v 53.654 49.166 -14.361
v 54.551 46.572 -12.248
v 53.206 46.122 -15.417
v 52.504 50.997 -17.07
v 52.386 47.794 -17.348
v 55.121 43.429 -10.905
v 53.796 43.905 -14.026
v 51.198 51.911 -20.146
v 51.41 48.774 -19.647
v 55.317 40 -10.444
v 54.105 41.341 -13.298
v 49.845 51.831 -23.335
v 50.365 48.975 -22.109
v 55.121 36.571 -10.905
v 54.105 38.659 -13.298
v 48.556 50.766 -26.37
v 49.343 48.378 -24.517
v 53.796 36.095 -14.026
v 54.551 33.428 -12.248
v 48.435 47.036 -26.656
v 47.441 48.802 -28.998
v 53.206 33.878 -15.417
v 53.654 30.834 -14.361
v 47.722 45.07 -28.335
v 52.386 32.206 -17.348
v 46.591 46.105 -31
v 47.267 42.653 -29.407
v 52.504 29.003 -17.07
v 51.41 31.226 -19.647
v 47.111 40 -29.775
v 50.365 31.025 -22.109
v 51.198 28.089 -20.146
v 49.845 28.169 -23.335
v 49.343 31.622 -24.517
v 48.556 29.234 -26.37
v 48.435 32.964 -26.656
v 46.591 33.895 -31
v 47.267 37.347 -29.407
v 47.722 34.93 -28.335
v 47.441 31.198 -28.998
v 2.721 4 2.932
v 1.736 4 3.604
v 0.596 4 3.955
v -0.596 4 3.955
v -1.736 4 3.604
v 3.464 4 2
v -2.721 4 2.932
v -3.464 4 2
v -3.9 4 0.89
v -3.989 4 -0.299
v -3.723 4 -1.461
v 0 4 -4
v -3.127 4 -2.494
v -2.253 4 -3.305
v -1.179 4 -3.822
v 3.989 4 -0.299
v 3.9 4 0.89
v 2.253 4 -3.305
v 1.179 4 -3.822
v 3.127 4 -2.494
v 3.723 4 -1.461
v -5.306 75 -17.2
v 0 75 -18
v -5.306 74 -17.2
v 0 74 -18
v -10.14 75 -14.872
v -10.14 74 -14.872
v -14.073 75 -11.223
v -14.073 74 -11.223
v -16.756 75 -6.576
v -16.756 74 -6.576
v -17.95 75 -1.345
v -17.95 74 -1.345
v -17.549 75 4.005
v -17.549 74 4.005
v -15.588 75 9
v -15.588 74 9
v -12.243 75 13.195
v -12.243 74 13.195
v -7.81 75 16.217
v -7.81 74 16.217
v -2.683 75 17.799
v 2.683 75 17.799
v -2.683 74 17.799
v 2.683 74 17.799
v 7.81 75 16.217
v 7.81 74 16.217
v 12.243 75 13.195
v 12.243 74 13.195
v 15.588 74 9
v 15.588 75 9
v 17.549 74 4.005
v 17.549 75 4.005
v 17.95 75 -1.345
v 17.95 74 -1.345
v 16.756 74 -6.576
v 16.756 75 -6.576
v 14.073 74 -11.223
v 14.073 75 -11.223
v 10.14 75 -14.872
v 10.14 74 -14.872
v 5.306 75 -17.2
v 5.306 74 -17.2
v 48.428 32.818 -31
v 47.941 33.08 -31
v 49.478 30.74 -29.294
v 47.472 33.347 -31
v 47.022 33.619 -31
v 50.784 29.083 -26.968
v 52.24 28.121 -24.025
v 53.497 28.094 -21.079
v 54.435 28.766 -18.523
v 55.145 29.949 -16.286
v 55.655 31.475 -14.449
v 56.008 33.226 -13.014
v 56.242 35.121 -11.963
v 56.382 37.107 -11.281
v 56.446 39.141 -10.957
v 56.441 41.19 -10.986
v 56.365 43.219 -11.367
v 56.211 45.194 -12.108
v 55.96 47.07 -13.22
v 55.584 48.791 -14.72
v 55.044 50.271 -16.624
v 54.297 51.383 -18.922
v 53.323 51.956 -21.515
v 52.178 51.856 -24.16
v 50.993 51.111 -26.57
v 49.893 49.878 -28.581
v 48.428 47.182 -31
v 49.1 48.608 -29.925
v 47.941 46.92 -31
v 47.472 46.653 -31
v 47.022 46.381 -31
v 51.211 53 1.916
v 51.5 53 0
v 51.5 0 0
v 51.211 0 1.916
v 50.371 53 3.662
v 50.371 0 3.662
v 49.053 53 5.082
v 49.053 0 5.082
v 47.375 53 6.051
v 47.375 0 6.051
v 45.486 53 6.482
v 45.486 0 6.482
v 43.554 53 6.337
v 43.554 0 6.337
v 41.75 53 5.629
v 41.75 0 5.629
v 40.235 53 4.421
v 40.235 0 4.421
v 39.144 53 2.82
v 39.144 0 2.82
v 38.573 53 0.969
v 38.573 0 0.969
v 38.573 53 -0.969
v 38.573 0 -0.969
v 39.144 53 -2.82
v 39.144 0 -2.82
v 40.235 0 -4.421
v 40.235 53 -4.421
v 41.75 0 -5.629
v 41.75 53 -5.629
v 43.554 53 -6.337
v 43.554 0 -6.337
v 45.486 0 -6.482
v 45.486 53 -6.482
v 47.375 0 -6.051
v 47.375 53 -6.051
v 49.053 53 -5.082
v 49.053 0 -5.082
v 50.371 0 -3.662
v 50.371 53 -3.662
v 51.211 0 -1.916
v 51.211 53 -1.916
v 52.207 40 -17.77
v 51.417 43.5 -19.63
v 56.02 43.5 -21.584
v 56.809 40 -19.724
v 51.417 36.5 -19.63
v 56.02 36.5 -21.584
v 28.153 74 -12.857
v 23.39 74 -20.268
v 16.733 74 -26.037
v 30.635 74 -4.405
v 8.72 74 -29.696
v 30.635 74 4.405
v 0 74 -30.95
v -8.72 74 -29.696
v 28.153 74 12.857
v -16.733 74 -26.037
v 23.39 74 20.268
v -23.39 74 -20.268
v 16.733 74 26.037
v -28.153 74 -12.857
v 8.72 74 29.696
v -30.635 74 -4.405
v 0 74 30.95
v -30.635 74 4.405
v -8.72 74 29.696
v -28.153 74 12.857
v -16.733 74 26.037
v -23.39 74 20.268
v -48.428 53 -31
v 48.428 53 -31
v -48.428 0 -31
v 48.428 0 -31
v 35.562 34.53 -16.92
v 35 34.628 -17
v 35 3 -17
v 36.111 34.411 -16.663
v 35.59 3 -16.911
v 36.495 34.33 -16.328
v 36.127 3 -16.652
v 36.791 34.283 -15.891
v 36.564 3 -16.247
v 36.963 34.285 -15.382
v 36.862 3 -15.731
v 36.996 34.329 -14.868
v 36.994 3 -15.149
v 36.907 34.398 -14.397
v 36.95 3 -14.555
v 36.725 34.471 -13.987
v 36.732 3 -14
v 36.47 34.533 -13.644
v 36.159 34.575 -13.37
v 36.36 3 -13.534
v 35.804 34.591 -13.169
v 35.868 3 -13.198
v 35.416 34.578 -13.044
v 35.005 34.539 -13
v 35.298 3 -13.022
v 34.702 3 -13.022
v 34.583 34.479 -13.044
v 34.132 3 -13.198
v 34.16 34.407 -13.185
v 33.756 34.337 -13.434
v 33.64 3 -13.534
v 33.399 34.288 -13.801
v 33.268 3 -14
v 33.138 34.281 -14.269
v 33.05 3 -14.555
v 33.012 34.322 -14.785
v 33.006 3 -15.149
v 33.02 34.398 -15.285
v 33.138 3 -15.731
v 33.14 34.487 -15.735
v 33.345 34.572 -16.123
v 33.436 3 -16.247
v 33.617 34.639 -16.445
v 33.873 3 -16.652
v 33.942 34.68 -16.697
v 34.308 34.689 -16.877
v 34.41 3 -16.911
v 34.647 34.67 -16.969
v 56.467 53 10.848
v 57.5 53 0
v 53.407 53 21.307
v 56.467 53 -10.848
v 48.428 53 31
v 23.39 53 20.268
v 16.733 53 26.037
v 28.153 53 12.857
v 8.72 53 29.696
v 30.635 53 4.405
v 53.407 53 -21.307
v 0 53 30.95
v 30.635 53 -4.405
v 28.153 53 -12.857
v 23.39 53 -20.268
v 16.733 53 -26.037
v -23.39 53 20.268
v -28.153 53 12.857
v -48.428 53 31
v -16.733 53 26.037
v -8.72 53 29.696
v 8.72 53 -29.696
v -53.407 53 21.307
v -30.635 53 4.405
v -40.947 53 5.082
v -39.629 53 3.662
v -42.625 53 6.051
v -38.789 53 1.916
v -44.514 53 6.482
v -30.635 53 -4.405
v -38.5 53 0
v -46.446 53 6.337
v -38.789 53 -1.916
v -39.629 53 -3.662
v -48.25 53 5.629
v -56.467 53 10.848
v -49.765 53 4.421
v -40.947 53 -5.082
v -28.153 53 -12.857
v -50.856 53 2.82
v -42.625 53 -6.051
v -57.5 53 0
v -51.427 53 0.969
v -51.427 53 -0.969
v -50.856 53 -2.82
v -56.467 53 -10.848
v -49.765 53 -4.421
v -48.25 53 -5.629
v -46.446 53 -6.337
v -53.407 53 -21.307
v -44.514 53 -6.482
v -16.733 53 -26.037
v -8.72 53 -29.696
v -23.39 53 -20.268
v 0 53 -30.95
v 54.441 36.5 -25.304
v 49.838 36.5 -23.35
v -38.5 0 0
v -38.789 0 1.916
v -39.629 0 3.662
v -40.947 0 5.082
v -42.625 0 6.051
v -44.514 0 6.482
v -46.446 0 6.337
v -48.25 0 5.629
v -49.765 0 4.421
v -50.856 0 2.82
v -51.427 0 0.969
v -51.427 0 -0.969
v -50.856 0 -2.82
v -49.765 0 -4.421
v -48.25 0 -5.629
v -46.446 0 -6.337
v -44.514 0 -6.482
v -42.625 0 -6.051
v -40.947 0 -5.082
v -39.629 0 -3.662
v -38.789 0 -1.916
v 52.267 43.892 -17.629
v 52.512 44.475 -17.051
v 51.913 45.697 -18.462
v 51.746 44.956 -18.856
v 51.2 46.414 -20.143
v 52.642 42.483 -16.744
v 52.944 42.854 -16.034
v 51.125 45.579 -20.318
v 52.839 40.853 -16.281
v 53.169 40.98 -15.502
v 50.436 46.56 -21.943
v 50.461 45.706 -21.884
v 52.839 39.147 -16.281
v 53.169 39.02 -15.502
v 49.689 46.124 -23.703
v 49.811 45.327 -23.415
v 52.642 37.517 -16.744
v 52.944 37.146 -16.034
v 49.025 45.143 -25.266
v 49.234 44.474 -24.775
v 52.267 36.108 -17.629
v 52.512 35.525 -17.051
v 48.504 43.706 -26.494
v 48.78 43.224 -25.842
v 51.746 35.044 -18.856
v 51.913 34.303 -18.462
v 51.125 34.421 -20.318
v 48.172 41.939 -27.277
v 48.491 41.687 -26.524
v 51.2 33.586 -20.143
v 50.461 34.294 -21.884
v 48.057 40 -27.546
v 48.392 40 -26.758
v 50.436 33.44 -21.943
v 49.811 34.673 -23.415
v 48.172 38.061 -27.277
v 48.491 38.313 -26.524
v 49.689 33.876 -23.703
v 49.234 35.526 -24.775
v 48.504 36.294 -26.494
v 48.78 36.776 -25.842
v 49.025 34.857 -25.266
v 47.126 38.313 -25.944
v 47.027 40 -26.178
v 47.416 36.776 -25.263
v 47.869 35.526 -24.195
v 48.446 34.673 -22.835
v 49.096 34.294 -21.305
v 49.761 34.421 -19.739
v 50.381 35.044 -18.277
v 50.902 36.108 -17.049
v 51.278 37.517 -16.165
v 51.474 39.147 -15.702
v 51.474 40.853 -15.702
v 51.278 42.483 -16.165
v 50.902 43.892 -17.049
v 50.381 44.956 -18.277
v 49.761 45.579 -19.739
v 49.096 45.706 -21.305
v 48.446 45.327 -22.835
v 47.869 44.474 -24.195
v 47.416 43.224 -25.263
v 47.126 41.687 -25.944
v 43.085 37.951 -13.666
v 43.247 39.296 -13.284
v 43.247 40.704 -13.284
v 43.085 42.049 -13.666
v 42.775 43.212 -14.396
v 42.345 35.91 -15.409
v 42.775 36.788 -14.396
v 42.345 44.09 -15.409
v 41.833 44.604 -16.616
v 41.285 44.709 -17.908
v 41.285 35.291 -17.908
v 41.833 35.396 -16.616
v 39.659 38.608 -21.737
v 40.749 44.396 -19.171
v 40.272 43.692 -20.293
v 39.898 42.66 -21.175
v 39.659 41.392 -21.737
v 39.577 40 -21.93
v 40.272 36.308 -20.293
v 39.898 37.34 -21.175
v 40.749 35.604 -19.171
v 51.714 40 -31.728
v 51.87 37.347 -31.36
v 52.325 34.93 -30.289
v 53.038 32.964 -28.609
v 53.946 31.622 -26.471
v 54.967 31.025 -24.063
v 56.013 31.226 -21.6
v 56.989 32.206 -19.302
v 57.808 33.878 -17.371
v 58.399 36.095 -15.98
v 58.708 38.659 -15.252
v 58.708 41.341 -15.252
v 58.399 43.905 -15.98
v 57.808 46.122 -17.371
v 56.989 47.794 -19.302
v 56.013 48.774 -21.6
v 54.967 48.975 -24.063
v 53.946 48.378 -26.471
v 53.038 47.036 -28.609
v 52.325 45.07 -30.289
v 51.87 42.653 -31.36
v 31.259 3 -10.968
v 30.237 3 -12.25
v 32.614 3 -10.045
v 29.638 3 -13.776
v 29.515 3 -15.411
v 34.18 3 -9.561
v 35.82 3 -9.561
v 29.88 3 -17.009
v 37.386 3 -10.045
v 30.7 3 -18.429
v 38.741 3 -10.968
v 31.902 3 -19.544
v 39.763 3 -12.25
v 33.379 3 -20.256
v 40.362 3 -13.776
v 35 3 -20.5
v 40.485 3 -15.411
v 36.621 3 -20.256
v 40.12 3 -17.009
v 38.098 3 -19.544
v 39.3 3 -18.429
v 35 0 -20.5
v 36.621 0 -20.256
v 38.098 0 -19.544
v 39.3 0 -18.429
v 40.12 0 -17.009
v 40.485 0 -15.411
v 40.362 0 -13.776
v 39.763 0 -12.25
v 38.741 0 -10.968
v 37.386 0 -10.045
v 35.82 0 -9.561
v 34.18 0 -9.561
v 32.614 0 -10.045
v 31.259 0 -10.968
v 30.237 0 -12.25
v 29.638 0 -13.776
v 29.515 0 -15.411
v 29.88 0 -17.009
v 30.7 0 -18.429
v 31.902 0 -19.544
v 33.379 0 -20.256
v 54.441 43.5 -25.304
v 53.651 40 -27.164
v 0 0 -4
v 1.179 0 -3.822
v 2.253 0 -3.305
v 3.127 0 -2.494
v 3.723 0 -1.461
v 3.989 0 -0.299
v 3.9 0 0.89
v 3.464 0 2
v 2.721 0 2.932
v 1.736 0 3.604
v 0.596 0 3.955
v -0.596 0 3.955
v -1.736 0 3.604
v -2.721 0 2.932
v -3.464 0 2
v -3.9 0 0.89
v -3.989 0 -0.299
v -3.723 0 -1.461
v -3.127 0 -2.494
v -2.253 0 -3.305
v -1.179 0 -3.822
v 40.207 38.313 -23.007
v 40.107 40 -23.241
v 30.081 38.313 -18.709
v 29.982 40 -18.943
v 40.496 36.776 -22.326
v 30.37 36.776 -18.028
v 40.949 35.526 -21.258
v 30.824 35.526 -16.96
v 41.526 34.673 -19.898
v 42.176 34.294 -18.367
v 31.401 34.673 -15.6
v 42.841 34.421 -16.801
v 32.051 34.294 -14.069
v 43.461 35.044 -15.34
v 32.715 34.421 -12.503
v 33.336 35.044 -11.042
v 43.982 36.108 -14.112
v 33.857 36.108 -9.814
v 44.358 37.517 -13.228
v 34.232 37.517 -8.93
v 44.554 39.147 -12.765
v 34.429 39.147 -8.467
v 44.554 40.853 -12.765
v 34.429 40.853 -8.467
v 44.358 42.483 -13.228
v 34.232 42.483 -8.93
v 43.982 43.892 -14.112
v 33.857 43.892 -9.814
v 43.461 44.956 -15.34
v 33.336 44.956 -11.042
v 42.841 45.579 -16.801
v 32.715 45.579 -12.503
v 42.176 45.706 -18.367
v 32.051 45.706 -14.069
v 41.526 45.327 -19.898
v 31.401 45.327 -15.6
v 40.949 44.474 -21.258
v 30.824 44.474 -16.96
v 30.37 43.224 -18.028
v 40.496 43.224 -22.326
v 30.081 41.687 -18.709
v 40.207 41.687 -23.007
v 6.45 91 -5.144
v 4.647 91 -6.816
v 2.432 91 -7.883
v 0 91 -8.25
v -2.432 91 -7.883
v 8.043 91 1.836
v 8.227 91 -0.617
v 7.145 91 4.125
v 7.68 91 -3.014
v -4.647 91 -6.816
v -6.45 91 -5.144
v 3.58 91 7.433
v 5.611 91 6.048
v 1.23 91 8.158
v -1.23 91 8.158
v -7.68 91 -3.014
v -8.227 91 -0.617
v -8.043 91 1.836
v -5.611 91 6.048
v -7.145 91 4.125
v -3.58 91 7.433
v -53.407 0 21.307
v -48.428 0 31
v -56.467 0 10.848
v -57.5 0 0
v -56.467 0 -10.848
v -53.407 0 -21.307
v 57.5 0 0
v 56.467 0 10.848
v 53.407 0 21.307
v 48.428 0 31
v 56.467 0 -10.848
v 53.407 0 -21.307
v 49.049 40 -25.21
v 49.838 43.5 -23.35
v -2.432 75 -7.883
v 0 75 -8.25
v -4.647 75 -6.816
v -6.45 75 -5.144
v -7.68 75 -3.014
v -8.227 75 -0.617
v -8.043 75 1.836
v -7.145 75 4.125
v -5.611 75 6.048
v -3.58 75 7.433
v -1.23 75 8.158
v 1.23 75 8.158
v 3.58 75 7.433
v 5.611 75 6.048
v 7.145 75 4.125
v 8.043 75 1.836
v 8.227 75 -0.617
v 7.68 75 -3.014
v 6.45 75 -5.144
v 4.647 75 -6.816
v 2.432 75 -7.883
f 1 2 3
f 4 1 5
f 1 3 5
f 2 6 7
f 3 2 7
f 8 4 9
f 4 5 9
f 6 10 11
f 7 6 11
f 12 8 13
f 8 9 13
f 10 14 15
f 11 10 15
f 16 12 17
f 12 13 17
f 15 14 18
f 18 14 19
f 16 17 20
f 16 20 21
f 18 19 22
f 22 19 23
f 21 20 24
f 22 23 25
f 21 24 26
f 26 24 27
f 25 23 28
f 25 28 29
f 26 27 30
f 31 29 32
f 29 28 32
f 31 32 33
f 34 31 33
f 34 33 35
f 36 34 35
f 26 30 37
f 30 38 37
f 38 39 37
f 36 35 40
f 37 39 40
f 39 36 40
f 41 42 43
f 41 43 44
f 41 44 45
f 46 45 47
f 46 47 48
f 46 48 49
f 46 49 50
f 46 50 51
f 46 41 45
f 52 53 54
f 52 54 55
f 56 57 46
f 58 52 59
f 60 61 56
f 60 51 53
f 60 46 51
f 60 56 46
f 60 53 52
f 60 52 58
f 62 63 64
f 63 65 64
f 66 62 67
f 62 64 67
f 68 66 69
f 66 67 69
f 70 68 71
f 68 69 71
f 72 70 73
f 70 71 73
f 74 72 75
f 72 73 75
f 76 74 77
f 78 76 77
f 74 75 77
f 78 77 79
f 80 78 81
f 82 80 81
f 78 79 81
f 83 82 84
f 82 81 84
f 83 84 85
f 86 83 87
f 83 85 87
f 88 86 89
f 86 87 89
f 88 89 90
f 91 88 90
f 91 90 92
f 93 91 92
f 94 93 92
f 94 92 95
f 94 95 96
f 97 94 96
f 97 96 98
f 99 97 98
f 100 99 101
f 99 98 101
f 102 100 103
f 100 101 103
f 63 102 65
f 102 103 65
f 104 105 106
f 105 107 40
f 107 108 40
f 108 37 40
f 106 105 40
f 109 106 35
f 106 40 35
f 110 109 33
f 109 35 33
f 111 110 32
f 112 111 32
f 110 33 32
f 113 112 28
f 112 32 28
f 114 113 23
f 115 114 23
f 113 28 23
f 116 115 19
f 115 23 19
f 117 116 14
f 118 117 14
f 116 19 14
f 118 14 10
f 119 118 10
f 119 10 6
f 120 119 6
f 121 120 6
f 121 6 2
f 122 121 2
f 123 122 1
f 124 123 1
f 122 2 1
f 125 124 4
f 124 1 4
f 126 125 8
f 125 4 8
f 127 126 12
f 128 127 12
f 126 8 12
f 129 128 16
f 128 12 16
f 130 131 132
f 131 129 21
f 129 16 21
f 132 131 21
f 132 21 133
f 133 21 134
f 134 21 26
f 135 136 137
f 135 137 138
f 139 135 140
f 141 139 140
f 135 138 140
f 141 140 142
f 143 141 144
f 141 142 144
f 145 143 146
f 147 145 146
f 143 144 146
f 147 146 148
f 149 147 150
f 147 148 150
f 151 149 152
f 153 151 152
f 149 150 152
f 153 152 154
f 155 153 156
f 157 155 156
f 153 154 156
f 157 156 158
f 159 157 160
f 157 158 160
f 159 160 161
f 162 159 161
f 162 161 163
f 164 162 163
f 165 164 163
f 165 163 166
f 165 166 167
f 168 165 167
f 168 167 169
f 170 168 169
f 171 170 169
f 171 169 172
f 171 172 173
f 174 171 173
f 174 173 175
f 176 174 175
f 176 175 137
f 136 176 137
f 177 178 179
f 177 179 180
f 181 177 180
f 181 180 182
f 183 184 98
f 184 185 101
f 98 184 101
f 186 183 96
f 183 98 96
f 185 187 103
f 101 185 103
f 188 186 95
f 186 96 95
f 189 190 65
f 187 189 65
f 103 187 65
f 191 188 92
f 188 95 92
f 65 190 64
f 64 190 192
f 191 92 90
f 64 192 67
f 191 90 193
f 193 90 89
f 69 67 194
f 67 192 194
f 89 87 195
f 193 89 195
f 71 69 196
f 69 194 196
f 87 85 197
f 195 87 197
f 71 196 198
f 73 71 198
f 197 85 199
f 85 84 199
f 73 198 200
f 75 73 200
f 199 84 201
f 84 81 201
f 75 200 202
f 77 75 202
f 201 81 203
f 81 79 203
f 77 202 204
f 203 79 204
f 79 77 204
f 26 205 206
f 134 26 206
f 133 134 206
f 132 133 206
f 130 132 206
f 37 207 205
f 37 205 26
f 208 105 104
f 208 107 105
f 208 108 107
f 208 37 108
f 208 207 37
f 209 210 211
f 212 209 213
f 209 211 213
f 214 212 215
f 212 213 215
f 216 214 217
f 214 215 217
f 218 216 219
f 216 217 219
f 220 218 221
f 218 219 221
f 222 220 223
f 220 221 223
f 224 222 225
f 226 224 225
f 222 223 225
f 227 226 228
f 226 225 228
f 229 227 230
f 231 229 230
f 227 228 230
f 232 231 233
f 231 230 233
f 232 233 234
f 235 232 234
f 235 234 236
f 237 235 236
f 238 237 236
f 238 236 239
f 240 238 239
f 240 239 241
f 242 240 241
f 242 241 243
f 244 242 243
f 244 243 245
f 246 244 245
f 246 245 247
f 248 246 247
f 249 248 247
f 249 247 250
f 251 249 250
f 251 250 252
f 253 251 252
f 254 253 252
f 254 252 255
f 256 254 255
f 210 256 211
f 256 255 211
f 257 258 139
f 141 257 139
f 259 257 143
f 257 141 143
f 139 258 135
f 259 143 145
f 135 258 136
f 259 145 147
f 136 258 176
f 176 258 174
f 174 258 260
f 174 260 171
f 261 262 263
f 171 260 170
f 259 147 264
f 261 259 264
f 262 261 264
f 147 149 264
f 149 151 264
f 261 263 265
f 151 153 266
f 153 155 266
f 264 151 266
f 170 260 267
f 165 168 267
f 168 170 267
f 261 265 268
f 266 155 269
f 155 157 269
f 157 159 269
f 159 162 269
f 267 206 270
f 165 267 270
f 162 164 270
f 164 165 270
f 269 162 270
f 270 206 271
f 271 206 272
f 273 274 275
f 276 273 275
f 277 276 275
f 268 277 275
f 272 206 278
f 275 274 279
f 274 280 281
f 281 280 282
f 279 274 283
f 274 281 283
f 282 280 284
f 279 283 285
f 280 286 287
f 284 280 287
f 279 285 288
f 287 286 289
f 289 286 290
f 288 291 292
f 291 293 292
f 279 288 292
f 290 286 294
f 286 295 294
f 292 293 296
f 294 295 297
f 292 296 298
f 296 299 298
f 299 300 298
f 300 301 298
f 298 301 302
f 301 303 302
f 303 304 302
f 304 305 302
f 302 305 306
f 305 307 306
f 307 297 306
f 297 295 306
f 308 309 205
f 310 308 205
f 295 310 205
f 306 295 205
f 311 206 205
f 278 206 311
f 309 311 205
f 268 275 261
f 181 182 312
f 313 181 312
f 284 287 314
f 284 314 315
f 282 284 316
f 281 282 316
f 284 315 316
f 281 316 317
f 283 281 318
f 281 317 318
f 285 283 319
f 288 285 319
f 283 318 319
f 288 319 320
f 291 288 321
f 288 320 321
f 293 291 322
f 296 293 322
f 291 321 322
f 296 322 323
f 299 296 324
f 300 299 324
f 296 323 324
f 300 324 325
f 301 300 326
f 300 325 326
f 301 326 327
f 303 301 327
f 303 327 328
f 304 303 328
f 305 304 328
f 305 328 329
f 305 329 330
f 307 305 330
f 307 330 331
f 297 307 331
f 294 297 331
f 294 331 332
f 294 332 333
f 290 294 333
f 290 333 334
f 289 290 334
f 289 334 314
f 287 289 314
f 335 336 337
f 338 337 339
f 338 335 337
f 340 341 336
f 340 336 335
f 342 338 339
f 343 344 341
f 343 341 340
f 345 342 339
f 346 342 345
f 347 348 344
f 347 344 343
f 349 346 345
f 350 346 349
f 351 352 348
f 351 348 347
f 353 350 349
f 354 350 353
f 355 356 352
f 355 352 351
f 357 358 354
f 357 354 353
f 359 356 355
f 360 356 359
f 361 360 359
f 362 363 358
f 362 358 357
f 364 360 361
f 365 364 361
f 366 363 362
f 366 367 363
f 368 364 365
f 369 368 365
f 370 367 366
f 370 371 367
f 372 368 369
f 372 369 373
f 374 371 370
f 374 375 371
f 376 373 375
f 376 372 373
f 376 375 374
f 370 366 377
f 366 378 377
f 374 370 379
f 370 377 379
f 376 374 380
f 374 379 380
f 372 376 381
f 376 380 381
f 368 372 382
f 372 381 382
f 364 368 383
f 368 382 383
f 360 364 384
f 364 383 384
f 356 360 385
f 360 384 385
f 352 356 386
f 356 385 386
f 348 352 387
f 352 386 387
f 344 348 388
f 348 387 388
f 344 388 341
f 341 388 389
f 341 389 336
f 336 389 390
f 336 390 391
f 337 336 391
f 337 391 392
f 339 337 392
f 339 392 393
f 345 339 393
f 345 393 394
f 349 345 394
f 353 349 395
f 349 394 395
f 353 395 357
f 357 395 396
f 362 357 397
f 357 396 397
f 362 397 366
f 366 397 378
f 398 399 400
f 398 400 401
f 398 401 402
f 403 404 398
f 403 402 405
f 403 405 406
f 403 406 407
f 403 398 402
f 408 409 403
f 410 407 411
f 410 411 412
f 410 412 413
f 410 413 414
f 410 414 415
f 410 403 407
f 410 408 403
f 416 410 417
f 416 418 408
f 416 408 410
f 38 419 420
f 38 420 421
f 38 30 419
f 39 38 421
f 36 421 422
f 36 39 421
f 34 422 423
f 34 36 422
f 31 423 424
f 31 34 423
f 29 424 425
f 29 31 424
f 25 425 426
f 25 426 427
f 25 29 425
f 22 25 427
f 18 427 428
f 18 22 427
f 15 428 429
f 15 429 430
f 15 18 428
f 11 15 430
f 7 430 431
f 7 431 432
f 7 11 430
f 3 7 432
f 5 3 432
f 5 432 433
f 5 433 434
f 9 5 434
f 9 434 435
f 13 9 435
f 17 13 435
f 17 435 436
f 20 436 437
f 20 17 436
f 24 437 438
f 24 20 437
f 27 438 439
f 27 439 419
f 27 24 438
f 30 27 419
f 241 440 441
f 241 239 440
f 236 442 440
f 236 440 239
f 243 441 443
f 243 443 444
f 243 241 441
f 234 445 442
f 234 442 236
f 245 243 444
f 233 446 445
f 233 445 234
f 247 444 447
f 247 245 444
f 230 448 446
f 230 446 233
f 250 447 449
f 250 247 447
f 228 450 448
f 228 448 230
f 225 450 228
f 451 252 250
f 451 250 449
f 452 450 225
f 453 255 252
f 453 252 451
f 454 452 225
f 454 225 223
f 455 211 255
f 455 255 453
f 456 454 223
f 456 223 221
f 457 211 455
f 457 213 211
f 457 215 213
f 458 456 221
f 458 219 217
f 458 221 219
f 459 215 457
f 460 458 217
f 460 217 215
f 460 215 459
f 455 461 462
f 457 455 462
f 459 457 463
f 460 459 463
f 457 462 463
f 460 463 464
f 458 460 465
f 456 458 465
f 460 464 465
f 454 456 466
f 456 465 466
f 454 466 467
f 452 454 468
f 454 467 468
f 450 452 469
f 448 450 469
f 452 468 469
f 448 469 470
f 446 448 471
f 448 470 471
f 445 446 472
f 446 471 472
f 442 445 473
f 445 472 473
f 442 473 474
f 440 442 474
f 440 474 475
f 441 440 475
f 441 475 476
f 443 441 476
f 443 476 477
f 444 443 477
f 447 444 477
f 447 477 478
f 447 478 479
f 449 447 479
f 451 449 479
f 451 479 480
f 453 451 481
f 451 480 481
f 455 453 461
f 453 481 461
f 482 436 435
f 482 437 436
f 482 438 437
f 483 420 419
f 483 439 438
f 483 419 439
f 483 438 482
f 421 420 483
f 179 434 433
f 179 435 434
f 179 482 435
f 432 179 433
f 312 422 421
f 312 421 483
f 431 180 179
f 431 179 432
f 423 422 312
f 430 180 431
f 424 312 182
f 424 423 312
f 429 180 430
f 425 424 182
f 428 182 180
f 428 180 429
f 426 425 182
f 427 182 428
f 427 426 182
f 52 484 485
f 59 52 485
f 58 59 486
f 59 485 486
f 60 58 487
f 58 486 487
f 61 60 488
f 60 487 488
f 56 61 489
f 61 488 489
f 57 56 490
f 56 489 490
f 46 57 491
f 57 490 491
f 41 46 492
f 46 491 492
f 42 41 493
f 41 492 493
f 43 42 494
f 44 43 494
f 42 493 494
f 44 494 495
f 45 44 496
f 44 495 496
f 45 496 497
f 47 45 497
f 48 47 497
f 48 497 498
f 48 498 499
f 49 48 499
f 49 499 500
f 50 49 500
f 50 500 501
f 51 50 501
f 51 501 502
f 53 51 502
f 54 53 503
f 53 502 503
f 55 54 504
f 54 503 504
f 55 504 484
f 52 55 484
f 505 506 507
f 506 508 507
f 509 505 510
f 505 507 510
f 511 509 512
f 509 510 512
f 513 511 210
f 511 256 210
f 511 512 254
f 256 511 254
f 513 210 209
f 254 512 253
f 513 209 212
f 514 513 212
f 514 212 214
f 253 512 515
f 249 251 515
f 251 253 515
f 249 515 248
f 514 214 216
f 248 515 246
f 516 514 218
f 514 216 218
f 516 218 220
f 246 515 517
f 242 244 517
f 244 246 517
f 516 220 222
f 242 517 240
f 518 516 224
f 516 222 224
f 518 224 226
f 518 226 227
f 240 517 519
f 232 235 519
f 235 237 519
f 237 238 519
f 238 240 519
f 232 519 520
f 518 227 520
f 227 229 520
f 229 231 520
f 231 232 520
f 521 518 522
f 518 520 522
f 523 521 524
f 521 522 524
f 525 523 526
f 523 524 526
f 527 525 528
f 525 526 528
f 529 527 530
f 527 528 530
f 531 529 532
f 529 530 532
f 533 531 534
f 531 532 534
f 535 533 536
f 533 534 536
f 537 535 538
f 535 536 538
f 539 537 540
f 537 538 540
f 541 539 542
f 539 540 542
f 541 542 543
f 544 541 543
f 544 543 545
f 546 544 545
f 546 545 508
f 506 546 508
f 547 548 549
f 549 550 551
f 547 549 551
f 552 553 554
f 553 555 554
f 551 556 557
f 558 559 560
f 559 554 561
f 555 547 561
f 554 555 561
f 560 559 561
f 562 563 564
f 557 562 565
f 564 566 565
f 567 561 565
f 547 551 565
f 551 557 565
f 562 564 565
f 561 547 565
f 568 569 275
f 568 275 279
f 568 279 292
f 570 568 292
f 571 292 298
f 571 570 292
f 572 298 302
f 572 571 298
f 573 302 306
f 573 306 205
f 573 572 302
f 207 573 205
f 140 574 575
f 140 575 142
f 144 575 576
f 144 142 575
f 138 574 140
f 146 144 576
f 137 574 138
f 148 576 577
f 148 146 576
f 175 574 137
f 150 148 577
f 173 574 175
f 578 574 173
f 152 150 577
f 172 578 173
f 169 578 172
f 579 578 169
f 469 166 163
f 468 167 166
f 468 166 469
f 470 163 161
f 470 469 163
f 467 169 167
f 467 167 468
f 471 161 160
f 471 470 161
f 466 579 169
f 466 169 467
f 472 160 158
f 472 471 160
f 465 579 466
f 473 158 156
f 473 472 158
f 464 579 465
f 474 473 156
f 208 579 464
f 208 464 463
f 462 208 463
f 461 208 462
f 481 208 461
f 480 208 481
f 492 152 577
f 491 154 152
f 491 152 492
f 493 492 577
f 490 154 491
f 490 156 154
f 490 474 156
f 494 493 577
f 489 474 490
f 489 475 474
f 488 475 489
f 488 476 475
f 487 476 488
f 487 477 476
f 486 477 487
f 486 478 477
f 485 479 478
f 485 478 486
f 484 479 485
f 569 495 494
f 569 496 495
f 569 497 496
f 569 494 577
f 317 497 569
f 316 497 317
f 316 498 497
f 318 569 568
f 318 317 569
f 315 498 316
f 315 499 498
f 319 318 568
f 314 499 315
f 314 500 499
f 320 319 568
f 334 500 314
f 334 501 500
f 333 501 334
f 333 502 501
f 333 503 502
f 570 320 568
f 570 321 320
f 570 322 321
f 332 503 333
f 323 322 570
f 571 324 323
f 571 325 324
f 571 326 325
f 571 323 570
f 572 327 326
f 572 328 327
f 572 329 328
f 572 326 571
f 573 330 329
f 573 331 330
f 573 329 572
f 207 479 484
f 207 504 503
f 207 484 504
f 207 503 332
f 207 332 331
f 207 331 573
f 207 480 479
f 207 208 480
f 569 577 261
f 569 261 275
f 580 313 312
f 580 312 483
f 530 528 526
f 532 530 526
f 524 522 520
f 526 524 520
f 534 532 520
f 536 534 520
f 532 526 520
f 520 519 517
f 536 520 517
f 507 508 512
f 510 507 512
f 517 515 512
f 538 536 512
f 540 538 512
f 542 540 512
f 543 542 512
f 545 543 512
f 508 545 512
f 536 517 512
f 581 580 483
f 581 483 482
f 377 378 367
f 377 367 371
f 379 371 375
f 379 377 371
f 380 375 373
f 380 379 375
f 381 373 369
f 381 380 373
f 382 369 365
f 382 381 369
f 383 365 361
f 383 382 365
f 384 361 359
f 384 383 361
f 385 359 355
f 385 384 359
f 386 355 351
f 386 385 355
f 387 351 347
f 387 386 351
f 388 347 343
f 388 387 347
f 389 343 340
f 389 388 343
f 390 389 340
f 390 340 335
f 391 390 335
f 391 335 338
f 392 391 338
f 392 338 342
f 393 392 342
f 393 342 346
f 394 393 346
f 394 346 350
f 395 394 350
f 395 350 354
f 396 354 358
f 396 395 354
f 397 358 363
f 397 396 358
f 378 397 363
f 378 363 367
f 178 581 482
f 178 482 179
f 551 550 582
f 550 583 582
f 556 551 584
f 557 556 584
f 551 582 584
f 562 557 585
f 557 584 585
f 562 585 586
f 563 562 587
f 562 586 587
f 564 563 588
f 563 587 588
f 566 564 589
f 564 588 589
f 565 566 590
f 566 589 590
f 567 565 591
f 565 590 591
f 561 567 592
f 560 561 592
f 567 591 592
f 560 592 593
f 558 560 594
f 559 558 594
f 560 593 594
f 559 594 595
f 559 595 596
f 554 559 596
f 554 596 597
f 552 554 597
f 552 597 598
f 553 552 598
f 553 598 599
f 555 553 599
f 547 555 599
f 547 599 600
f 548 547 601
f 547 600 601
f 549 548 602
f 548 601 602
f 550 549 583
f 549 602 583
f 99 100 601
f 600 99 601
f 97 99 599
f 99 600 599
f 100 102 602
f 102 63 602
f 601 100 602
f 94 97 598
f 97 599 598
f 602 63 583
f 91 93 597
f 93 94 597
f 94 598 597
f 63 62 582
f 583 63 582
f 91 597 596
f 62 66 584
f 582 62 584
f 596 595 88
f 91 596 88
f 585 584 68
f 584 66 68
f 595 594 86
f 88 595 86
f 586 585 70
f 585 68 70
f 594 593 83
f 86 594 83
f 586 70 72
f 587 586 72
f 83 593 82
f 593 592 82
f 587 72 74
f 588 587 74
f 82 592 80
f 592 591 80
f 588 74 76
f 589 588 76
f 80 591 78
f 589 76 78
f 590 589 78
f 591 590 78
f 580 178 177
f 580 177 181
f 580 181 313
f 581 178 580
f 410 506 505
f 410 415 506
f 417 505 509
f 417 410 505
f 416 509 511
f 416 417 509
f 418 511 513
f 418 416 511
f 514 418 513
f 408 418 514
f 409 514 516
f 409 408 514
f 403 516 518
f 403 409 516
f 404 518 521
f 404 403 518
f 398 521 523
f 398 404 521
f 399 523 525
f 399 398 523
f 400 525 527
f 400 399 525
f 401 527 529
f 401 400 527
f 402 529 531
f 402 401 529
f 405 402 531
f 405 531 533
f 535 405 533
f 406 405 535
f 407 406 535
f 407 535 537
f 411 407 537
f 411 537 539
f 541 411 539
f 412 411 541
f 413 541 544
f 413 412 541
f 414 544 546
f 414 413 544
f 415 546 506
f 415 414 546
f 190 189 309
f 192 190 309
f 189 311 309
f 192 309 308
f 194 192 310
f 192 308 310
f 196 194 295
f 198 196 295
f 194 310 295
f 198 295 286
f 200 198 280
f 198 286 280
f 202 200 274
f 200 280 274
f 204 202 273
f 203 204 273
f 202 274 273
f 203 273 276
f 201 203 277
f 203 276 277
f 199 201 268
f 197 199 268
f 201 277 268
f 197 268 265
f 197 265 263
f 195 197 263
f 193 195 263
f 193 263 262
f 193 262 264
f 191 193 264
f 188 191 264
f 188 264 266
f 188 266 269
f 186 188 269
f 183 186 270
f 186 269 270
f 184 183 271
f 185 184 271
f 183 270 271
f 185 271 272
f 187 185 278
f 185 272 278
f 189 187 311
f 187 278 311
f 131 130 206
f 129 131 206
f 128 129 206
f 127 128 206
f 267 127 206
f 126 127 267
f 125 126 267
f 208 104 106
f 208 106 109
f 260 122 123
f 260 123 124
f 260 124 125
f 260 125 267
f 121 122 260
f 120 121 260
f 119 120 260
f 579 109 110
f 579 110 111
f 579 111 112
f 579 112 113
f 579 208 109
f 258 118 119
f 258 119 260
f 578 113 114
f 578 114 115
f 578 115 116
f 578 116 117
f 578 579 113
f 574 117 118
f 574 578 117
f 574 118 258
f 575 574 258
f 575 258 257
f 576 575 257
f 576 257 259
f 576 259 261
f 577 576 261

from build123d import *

# Parameters (mm, degrees)
EXTRUDE1_DEPTH     = 53
HOLE1_D            = 13
HOLE1_DEPTH        = 53
SKETCH5_R          = 4
CUT_EXTRUDE1_DEPTH = 4
SKETCH6_R          = 5.5
CUT_EXTRUDE2_DEPTH = 3
SKETCH7_R          = 2
CUT_EXTRUDE3_DEPTH = 33
CUT_EXTRUDE4_DEPTH = 5


with BuildPart() as part:
    # Sketch1 → Extrude1 (new body)
    with BuildSketch(Plane(origin=(0, 0, 0), x_dir=(1, 0, 0), z_dir=(0, 1, 0))):
        with BuildLine():
            Line((-48.427781283, 31), (48.427781283, 31))
            ThreePointArc((48.427781283, 31), (57.5, 0), (48.427781283, -31))
            Line((48.427781283, -31), (-48.427781283, -31))
            ThreePointArc((-48.427781283, -31), (-57.5, 0), (-48.427781283, 31))
        make_face()
    extrude(amount=EXTRUDE1_DEPTH)

    # Sketch2 → Revolve1 (revolve)
    with BuildSketch(Plane.XY, mode=Mode.PRIVATE) as revolve1_sk:
        Polygon((0, 91), (-8.25, 91), (-8.25, 75), (-18, 75), (-18, 74), (-30.95, 74), (-30.95, 53), (0, 53), align=None)
    revolve(revolve1_sk.sketch.rotate(Axis((0, 0, 0), (0, 1, 0)), 270), axis=Axis((0, 0, 0), (0, 1, 0)))  # turned: the seam where the file's is

    # Hole1
    with Locations(Plane(origin=(0, 53, 0), x_dir=(-1, 0, 0), z_dir=(0, 1, 0))):
        with Locations((45, 0), (-45, 0)):
            Hole(HOLE1_D / 2, depth=HOLE1_DEPTH)

    # Sketch5 → Cut-Extrude1 (cut)
    with BuildSketch(Plane.XZ):
        with Locations(Location((0, 0, 0), (0, 0, 270))):  # turned: the seam where the file's is
            Circle(SKETCH5_R)
    extrude(amount=-CUT_EXTRUDE1_DEPTH, mode=Mode.SUBTRACT)

    # Sketch6 → Cut-Extrude2 (cut)
    with BuildSketch(Plane.XZ):
        with Locations(Location((35, -15, 0), (0, 0, 270))):  # turned: the seam where the file's is
            Circle(SKETCH6_R)
    extrude(amount=-CUT_EXTRUDE2_DEPTH, mode=Mode.SUBTRACT)

    # Sketch7 → Cut-Extrude3 (cut)
    with BuildSketch(Plane.XZ.offset(-3)):
        with Locations(Location((35, -15, 0), (0, 0, 270))):  # turned: the seam where the file's is
            Circle(SKETCH7_R)
    extrude(amount=-CUT_EXTRUDE3_DEPTH, mode=Mode.SUBTRACT)

    # Sketch8 → Cut-Revolve1 (revolve, cut)
    with BuildSketch(Plane(origin=(0, 0, 0), x_dir=(0.920504853, 0, -0.390731128), z_dir=(0.390731128, 0, 0.920504853)), mode=Mode.PRIVATE) as cut_revolve1_sk:
        Polygon((57.5, 28), (55, 28), (55, 33.4215), (53.517364509, 34.2775), (35, 34.2775), (35, 40), (57.5, 40), align=None)
    revolve(cut_revolve1_sk.sketch.rotate(Axis((47.484793311, 40, -20.156098913), (-0.920504853, 0, 0.390731128)), 270), axis=Axis((47.484793311, 40, -20.156098913), (-0.920504853, 0, 0.390731128)), mode=Mode.SUBTRACT)  # turned: the seam where the file's is

    # Sketch9 → Revolve2 (revolve)
    with BuildSketch(Plane(origin=(0, 0, 0), x_dir=(0.920504853, 0, -0.390731128), z_dir=(0.390731128, 0, 0.920504853)), mode=Mode.PRIVATE) as revolve2_sk:
        Polygon((55, 31), (55, 34.2775), (46, 34.2775), (45, 35.2775), (45, 40), (60, 40), (60, 31), align=None)
    revolve(revolve2_sk.sketch.rotate(Axis((68.658528533, 40, -29.14381628), (-0.920504853, 0, 0.390731128)), 270), axis=Axis((68.658528533, 40, -29.14381628), (-0.920504853, 0, 0.390731128)))  # turned: the seam where the file's is

    # Sketch10 → Cut-Extrude4 (cut)
    with BuildSketch(Plane(origin=(55.230291207, 0, -23.443867709), x_dir=(-0.390731128, 0, -0.920504853), z_dir=(0.920504853, 0, -0.390731128))):
        Polygon((4.041451884, 40), (2.020725942, 43.5), (-2.020725942, 43.5), (-4.041451884, 40), (-2.020725942, 36.5), (2.020725942, 36.5), align=None)
    extrude(amount=-CUT_EXTRUDE4_DEPTH, mode=Mode.SUBTRACT)


solid = part.part
